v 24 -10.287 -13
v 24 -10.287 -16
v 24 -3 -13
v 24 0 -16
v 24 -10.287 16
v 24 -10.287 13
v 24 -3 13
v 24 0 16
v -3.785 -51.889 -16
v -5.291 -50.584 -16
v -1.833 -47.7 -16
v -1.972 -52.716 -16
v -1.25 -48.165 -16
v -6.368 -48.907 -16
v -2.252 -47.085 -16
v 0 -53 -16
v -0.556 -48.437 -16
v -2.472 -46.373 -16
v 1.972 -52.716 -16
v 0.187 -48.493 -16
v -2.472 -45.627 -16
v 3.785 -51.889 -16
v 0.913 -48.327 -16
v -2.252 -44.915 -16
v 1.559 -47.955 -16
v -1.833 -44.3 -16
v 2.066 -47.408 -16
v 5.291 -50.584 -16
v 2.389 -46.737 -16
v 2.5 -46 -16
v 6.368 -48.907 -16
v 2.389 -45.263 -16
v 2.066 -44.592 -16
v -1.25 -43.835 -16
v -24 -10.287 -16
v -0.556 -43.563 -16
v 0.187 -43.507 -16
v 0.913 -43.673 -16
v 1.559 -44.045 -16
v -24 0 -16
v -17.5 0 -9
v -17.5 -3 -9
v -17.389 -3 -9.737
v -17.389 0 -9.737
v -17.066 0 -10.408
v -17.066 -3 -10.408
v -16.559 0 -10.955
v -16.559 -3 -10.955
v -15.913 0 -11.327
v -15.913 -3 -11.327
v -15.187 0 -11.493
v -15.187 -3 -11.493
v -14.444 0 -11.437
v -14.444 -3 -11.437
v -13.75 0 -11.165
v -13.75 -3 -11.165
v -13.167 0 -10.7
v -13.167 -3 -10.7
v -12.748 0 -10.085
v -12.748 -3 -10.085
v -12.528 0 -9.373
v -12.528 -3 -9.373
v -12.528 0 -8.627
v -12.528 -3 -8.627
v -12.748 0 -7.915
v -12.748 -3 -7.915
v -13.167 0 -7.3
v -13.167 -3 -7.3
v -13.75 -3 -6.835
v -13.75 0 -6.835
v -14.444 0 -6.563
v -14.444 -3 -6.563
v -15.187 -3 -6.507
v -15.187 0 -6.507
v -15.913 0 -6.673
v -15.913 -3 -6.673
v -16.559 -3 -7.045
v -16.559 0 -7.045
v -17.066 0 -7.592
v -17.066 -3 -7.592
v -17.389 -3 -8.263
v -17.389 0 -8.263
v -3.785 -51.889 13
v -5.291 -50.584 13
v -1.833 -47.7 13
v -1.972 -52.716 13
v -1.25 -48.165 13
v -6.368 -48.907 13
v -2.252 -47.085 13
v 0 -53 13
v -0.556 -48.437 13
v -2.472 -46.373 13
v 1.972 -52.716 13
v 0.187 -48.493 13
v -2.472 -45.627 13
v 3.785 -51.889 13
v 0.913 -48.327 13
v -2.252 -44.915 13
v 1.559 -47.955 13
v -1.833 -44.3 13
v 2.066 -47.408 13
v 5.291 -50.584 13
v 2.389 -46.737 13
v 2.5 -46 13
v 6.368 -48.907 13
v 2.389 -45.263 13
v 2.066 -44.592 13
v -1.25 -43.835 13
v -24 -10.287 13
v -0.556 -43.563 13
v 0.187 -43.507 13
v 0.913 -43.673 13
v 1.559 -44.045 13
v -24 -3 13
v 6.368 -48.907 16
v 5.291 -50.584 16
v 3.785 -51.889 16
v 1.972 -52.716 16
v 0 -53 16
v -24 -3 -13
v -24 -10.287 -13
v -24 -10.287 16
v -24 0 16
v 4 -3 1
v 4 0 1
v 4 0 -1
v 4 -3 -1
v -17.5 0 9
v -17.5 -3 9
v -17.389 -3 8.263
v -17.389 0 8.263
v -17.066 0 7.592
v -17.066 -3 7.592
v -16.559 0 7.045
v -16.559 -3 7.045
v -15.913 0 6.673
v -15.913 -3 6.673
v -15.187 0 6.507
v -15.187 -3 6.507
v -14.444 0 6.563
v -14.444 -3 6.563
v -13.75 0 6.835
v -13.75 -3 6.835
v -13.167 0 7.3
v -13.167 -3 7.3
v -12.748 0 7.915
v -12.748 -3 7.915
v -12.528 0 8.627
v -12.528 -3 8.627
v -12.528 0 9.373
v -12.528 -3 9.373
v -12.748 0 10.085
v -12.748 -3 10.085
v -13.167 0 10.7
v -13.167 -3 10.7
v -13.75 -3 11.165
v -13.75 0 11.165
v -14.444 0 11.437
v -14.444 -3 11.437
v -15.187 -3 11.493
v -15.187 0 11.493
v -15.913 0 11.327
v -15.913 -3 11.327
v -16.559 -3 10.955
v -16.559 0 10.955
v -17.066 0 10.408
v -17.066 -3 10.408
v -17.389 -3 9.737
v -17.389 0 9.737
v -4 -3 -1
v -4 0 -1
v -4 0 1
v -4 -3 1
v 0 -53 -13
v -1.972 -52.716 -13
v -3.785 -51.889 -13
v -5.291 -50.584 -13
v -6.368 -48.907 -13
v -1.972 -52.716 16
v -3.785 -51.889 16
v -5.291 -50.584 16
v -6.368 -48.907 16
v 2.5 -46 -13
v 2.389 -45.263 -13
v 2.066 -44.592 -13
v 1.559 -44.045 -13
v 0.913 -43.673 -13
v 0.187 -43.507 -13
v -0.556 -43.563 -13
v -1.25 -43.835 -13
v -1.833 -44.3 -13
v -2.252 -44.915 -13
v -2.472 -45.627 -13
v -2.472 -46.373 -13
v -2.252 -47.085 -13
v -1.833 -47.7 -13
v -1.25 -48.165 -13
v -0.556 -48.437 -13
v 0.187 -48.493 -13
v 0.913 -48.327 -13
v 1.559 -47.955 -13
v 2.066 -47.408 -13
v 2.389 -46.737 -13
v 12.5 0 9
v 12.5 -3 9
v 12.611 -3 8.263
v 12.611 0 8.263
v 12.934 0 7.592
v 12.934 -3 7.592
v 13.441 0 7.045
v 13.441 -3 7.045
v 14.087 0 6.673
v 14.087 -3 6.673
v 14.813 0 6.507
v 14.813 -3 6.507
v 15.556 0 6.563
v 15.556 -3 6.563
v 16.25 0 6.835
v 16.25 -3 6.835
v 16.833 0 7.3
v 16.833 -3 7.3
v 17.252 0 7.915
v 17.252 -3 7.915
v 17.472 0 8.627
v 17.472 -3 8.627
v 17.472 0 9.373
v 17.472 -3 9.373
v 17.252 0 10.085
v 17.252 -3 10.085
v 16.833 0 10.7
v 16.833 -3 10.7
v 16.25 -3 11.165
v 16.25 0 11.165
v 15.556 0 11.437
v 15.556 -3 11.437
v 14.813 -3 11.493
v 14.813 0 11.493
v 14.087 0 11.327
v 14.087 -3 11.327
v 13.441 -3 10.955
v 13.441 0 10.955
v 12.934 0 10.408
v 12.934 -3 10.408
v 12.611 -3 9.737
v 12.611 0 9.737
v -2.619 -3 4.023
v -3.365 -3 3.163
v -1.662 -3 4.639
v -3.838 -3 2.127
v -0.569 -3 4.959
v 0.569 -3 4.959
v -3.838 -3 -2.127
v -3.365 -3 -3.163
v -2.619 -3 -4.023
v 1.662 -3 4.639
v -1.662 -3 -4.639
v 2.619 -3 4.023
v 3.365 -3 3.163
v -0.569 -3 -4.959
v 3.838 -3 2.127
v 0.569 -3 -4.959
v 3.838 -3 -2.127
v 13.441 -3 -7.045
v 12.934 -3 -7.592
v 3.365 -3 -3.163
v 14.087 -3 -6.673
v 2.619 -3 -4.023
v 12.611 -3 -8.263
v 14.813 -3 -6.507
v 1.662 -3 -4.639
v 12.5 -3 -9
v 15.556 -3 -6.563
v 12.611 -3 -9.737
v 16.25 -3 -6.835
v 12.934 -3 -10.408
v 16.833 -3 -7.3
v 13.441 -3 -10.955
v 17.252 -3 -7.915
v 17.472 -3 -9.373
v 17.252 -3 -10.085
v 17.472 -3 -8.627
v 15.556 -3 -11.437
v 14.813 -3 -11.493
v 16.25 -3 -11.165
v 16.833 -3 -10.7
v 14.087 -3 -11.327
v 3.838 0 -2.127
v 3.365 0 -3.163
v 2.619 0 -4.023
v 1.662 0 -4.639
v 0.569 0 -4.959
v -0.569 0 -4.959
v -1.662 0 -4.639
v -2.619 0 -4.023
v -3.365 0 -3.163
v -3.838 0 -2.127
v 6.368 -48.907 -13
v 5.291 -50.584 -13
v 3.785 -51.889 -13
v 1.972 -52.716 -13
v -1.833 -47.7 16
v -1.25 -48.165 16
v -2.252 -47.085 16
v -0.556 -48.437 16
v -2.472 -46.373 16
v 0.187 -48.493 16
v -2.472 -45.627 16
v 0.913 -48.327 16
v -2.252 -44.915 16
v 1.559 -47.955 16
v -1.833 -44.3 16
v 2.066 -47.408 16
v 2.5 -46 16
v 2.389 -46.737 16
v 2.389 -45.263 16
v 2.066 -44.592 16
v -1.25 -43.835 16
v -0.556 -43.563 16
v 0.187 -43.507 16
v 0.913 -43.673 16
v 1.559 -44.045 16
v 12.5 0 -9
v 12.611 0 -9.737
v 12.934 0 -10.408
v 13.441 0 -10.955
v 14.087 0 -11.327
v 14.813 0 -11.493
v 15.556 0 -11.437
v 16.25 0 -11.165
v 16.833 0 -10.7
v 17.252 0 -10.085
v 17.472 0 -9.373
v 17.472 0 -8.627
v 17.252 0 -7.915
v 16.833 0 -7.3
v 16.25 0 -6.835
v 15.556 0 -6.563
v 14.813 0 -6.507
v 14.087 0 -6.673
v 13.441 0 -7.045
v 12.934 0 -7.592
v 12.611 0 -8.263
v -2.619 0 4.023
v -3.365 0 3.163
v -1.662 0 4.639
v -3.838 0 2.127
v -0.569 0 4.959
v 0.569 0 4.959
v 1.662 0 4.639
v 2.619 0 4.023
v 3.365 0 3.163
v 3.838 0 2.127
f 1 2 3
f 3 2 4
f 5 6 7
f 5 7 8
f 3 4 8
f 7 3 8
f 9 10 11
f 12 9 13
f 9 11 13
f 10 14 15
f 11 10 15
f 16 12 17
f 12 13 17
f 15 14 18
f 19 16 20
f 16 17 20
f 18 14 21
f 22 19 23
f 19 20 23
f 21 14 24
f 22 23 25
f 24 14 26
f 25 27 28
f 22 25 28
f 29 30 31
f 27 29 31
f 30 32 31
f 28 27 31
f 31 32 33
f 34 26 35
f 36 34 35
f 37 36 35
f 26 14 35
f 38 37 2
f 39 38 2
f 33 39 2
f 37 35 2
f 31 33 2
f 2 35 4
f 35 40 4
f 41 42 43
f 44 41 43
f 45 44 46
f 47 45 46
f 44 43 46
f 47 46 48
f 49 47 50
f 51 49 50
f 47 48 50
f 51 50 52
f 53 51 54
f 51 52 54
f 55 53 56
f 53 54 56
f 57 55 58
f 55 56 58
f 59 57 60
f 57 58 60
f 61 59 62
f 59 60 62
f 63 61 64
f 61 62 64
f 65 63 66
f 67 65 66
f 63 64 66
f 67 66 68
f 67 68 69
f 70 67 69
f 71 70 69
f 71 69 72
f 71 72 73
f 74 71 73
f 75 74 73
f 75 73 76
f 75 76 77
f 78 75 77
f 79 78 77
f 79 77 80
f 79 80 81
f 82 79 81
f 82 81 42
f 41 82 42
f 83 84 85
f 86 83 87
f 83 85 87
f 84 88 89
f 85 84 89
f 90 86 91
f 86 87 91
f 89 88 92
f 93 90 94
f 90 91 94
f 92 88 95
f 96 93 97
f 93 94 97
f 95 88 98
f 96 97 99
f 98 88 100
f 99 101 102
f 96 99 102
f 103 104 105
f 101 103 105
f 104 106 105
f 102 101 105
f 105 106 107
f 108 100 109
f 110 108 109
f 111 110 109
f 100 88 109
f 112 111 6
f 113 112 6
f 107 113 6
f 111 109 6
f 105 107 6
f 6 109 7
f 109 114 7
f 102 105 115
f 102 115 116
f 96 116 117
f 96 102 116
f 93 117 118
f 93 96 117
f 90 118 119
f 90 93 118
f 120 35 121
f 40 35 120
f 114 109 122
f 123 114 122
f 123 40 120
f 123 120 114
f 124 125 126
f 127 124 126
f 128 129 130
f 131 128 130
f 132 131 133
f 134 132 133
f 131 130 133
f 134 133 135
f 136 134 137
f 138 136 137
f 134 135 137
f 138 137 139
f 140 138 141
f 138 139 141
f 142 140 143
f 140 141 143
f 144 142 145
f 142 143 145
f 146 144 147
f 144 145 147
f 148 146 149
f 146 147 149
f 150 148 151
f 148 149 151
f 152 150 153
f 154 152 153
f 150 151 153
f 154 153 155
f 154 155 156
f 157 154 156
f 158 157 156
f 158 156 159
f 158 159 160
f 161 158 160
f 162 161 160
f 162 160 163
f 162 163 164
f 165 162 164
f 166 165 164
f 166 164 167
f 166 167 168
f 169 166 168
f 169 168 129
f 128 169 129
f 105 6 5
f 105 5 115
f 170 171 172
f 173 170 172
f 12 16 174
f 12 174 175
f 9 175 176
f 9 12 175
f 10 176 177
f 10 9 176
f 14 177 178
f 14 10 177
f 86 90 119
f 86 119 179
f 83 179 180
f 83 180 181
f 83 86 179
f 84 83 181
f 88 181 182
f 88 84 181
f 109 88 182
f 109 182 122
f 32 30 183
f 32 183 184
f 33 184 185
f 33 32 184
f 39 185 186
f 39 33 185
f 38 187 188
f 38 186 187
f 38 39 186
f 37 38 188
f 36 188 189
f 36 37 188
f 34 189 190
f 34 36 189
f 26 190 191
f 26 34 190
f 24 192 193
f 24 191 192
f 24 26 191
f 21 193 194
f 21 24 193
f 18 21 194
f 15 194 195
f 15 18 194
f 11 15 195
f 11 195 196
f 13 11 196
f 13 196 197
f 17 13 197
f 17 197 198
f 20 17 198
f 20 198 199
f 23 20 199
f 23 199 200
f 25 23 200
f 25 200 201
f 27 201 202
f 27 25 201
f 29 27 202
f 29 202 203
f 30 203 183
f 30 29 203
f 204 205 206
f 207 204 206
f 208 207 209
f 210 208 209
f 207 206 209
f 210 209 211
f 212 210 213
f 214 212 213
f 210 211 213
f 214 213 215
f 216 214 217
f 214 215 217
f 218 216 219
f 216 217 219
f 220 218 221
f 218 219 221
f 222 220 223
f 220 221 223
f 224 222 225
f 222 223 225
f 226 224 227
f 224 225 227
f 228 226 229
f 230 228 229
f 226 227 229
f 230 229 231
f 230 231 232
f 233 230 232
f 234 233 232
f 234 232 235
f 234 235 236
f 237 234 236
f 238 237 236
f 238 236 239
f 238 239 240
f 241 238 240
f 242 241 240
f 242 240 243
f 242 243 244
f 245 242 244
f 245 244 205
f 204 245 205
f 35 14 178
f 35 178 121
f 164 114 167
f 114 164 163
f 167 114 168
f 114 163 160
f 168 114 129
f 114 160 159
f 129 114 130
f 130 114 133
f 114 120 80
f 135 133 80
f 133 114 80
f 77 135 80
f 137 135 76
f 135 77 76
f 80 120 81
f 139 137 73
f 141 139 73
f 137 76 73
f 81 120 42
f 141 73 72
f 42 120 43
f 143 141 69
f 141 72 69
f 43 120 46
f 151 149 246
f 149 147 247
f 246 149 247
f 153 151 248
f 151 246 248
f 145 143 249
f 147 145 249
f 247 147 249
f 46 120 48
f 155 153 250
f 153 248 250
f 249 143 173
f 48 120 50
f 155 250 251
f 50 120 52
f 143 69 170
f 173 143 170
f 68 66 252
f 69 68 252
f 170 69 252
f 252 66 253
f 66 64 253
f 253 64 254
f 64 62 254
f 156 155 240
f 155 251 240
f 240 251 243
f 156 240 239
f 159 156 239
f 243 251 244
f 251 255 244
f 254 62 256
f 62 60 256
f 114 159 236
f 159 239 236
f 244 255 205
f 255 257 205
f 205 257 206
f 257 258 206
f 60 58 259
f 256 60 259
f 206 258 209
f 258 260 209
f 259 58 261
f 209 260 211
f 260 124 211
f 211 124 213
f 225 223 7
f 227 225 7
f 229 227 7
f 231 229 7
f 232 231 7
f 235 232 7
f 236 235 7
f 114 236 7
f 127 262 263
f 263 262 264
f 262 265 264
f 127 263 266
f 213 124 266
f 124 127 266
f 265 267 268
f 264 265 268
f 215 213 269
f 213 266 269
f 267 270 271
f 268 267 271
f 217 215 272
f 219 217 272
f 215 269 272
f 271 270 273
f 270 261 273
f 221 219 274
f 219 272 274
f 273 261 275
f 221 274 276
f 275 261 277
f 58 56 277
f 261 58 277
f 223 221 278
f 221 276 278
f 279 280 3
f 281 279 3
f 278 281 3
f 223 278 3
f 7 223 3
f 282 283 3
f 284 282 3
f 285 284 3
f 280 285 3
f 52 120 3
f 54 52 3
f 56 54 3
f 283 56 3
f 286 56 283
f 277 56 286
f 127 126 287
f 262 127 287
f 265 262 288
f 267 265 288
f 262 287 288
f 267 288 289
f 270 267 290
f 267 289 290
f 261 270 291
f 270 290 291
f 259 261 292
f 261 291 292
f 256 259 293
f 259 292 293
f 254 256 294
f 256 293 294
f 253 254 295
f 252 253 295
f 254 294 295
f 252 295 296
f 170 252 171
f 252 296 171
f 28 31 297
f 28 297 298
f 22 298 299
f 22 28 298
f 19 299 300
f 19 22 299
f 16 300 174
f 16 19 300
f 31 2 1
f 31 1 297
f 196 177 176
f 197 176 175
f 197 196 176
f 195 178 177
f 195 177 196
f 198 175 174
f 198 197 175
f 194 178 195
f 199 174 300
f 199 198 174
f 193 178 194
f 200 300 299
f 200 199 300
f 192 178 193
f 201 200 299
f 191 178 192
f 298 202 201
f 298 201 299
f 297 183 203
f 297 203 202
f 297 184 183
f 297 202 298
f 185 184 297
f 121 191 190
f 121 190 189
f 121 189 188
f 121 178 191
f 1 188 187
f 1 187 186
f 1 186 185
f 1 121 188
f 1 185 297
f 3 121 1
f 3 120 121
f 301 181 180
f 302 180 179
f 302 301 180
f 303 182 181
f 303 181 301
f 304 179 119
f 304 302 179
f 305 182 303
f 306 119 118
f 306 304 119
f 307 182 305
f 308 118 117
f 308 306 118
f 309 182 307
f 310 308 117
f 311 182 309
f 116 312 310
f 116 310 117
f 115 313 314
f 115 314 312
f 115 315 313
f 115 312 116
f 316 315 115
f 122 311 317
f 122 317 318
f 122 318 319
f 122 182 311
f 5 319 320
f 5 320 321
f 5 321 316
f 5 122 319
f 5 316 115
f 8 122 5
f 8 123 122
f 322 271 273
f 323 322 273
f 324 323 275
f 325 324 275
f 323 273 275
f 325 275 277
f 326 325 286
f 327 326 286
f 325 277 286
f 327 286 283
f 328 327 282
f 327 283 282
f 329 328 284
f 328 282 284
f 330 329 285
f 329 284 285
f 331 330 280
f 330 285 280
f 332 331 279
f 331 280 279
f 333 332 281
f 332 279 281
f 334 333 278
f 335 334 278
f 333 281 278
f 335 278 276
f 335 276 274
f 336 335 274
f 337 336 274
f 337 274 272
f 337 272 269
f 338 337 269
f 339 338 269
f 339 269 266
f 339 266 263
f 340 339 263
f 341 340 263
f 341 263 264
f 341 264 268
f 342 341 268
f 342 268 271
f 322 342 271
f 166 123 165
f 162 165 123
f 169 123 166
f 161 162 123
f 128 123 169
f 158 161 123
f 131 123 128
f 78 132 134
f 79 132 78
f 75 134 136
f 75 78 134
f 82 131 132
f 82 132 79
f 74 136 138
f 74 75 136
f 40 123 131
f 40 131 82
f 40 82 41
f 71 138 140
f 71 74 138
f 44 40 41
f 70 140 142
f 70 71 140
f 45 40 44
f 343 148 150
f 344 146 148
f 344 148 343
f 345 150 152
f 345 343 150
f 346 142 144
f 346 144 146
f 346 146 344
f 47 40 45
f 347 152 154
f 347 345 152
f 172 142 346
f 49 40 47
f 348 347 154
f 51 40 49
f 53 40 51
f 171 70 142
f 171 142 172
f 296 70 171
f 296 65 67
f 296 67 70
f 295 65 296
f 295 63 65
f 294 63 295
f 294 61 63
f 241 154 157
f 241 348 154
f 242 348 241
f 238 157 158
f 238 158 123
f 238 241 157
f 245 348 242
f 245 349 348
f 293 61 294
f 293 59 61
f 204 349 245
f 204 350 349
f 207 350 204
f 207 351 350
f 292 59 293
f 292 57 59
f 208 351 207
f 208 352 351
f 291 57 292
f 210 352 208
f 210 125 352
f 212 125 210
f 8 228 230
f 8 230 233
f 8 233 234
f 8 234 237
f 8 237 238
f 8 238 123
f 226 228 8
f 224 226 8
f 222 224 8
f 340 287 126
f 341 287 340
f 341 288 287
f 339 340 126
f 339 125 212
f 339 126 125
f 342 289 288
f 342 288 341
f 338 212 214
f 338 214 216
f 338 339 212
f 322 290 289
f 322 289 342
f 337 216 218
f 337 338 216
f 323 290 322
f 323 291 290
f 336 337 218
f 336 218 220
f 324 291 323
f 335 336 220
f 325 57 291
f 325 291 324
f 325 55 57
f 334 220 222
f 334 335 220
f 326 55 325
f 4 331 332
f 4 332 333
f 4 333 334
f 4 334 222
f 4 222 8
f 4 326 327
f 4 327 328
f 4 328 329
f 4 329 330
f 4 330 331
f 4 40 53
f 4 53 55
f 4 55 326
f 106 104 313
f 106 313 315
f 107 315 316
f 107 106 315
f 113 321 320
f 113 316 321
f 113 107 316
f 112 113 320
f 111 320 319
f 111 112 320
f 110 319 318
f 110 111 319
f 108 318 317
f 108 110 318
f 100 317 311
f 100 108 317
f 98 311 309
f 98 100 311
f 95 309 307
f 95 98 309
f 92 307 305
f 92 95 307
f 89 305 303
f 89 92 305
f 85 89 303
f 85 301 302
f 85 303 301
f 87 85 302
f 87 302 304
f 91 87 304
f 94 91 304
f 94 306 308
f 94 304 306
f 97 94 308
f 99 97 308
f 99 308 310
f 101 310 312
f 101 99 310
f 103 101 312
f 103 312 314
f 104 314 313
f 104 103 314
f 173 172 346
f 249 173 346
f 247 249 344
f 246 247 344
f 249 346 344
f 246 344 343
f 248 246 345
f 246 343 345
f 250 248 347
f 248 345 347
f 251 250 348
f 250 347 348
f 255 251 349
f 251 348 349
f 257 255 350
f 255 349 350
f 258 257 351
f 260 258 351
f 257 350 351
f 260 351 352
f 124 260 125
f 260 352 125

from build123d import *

# Parameters (mm, degrees)
SKETCH1_W                = 48
SKETCH1_H                = 32
BOSS_EXTRUDE1_DEPTH      = 3
SKETCH2_W                = 48
SKETCH2_H                = 3
BOSS_EXTRUDE2_DEPTH      = 50
CUT_EXTRUDE1_DEPTH       = 67.400301204
CUT_EXTRUDE1_DEPTH_BACK  = 67.400301204
SKETCH3_R                = 2.5
F_5_0_5_DIAMETER_HOLE1_D = 5
KES_EKSTR_ZYON1_DEPTH    = 7


with BuildPart() as part:
    # Sketch1 → Boss-Extrude1 (new body)
    with BuildSketch(Plane(origin=(0, 0, 0), x_dir=(1, 0, 0), z_dir=(0, 1, 0))):
        Rectangle(SKETCH1_W, SKETCH1_H)
    extrude(amount=-BOSS_EXTRUDE1_DEPTH)

    # Sketch2 → Boss-Extrude2 (add)
    with BuildSketch(Plane.XZ.offset(3)):
        with Locations((0, 14.5)):
            Rectangle(SKETCH2_W, SKETCH2_H)
        with Locations((0, -14.5)):
            Rectangle(SKETCH2_W, SKETCH2_H)
    extrude(amount=BOSS_EXTRUDE2_DEPTH)

    # Sketch3 → Cut-Extrude1 (cut, two sides: drawn at the far end of the back side and taken through both)
    with BuildSketch(Plane.XY.offset(16).offset(-CUT_EXTRUDE1_DEPTH_BACK)):
        with BuildLine():
            Line((24, -53), (24, -10.287171893))
            Line((24, -10.287171893), (6.367730582, -48.907233604))
            ThreePointArc((6.367730582, -48.907233604), (3.784796178, -51.8885752), (-8.6e-08, -53))
            Line((-8.6e-08, -53), (24, -53))
        make_face()
        with BuildLine():
            Line((-24, -53), (-8.6e-08, -53))
            ThreePointArc((-8.6e-08, -53), (-3.784796251, -51.888575154), (-6.367730582, -48.907233604))
            Line((-6.367730582, -48.907233604), (-24, -10.287171893))
            Line((-24, -10.287171893), (-24, -53))
        make_face()
        with Locations((0, -46)):
            Circle(SKETCH3_R)
    extrude(amount=CUT_EXTRUDE1_DEPTH + CUT_EXTRUDE1_DEPTH_BACK, mode=Mode.SUBTRACT)

    # Ø5.0 (5) Diameter Hole1 (through all)
    with Locations(Plane(origin=(0, 0, 0), x_dir=(1, 0, 0), z_dir=(0, 1, 0))):
        with Locations((-15, -9), (-15, 9), (15, 9), (15, -9)):
            Hole(F_5_0_5_DIAMETER_HOLE1_D / 2)

    # Çizim1 → Kes-Ekstrüzyon1 (cut)
    with BuildSketch(Plane(origin=(0, 0, 0), x_dir=(1, 0, 0), z_dir=(0, 1, 0))):
        with BuildLine():
            Line((-4, 1), (-4, -1))
            ThreePointArc((-4, -1), (0, -5), (4, -1))
            Line((4, -1), (4, 1))
            ThreePointArc((4, 1), (0, 5), (-4, 1))
        make_face()
    extrude(amount=-KES_EKSTR_ZYON1_DEPTH, mode=Mode.SUBTRACT)


solid = part.part
